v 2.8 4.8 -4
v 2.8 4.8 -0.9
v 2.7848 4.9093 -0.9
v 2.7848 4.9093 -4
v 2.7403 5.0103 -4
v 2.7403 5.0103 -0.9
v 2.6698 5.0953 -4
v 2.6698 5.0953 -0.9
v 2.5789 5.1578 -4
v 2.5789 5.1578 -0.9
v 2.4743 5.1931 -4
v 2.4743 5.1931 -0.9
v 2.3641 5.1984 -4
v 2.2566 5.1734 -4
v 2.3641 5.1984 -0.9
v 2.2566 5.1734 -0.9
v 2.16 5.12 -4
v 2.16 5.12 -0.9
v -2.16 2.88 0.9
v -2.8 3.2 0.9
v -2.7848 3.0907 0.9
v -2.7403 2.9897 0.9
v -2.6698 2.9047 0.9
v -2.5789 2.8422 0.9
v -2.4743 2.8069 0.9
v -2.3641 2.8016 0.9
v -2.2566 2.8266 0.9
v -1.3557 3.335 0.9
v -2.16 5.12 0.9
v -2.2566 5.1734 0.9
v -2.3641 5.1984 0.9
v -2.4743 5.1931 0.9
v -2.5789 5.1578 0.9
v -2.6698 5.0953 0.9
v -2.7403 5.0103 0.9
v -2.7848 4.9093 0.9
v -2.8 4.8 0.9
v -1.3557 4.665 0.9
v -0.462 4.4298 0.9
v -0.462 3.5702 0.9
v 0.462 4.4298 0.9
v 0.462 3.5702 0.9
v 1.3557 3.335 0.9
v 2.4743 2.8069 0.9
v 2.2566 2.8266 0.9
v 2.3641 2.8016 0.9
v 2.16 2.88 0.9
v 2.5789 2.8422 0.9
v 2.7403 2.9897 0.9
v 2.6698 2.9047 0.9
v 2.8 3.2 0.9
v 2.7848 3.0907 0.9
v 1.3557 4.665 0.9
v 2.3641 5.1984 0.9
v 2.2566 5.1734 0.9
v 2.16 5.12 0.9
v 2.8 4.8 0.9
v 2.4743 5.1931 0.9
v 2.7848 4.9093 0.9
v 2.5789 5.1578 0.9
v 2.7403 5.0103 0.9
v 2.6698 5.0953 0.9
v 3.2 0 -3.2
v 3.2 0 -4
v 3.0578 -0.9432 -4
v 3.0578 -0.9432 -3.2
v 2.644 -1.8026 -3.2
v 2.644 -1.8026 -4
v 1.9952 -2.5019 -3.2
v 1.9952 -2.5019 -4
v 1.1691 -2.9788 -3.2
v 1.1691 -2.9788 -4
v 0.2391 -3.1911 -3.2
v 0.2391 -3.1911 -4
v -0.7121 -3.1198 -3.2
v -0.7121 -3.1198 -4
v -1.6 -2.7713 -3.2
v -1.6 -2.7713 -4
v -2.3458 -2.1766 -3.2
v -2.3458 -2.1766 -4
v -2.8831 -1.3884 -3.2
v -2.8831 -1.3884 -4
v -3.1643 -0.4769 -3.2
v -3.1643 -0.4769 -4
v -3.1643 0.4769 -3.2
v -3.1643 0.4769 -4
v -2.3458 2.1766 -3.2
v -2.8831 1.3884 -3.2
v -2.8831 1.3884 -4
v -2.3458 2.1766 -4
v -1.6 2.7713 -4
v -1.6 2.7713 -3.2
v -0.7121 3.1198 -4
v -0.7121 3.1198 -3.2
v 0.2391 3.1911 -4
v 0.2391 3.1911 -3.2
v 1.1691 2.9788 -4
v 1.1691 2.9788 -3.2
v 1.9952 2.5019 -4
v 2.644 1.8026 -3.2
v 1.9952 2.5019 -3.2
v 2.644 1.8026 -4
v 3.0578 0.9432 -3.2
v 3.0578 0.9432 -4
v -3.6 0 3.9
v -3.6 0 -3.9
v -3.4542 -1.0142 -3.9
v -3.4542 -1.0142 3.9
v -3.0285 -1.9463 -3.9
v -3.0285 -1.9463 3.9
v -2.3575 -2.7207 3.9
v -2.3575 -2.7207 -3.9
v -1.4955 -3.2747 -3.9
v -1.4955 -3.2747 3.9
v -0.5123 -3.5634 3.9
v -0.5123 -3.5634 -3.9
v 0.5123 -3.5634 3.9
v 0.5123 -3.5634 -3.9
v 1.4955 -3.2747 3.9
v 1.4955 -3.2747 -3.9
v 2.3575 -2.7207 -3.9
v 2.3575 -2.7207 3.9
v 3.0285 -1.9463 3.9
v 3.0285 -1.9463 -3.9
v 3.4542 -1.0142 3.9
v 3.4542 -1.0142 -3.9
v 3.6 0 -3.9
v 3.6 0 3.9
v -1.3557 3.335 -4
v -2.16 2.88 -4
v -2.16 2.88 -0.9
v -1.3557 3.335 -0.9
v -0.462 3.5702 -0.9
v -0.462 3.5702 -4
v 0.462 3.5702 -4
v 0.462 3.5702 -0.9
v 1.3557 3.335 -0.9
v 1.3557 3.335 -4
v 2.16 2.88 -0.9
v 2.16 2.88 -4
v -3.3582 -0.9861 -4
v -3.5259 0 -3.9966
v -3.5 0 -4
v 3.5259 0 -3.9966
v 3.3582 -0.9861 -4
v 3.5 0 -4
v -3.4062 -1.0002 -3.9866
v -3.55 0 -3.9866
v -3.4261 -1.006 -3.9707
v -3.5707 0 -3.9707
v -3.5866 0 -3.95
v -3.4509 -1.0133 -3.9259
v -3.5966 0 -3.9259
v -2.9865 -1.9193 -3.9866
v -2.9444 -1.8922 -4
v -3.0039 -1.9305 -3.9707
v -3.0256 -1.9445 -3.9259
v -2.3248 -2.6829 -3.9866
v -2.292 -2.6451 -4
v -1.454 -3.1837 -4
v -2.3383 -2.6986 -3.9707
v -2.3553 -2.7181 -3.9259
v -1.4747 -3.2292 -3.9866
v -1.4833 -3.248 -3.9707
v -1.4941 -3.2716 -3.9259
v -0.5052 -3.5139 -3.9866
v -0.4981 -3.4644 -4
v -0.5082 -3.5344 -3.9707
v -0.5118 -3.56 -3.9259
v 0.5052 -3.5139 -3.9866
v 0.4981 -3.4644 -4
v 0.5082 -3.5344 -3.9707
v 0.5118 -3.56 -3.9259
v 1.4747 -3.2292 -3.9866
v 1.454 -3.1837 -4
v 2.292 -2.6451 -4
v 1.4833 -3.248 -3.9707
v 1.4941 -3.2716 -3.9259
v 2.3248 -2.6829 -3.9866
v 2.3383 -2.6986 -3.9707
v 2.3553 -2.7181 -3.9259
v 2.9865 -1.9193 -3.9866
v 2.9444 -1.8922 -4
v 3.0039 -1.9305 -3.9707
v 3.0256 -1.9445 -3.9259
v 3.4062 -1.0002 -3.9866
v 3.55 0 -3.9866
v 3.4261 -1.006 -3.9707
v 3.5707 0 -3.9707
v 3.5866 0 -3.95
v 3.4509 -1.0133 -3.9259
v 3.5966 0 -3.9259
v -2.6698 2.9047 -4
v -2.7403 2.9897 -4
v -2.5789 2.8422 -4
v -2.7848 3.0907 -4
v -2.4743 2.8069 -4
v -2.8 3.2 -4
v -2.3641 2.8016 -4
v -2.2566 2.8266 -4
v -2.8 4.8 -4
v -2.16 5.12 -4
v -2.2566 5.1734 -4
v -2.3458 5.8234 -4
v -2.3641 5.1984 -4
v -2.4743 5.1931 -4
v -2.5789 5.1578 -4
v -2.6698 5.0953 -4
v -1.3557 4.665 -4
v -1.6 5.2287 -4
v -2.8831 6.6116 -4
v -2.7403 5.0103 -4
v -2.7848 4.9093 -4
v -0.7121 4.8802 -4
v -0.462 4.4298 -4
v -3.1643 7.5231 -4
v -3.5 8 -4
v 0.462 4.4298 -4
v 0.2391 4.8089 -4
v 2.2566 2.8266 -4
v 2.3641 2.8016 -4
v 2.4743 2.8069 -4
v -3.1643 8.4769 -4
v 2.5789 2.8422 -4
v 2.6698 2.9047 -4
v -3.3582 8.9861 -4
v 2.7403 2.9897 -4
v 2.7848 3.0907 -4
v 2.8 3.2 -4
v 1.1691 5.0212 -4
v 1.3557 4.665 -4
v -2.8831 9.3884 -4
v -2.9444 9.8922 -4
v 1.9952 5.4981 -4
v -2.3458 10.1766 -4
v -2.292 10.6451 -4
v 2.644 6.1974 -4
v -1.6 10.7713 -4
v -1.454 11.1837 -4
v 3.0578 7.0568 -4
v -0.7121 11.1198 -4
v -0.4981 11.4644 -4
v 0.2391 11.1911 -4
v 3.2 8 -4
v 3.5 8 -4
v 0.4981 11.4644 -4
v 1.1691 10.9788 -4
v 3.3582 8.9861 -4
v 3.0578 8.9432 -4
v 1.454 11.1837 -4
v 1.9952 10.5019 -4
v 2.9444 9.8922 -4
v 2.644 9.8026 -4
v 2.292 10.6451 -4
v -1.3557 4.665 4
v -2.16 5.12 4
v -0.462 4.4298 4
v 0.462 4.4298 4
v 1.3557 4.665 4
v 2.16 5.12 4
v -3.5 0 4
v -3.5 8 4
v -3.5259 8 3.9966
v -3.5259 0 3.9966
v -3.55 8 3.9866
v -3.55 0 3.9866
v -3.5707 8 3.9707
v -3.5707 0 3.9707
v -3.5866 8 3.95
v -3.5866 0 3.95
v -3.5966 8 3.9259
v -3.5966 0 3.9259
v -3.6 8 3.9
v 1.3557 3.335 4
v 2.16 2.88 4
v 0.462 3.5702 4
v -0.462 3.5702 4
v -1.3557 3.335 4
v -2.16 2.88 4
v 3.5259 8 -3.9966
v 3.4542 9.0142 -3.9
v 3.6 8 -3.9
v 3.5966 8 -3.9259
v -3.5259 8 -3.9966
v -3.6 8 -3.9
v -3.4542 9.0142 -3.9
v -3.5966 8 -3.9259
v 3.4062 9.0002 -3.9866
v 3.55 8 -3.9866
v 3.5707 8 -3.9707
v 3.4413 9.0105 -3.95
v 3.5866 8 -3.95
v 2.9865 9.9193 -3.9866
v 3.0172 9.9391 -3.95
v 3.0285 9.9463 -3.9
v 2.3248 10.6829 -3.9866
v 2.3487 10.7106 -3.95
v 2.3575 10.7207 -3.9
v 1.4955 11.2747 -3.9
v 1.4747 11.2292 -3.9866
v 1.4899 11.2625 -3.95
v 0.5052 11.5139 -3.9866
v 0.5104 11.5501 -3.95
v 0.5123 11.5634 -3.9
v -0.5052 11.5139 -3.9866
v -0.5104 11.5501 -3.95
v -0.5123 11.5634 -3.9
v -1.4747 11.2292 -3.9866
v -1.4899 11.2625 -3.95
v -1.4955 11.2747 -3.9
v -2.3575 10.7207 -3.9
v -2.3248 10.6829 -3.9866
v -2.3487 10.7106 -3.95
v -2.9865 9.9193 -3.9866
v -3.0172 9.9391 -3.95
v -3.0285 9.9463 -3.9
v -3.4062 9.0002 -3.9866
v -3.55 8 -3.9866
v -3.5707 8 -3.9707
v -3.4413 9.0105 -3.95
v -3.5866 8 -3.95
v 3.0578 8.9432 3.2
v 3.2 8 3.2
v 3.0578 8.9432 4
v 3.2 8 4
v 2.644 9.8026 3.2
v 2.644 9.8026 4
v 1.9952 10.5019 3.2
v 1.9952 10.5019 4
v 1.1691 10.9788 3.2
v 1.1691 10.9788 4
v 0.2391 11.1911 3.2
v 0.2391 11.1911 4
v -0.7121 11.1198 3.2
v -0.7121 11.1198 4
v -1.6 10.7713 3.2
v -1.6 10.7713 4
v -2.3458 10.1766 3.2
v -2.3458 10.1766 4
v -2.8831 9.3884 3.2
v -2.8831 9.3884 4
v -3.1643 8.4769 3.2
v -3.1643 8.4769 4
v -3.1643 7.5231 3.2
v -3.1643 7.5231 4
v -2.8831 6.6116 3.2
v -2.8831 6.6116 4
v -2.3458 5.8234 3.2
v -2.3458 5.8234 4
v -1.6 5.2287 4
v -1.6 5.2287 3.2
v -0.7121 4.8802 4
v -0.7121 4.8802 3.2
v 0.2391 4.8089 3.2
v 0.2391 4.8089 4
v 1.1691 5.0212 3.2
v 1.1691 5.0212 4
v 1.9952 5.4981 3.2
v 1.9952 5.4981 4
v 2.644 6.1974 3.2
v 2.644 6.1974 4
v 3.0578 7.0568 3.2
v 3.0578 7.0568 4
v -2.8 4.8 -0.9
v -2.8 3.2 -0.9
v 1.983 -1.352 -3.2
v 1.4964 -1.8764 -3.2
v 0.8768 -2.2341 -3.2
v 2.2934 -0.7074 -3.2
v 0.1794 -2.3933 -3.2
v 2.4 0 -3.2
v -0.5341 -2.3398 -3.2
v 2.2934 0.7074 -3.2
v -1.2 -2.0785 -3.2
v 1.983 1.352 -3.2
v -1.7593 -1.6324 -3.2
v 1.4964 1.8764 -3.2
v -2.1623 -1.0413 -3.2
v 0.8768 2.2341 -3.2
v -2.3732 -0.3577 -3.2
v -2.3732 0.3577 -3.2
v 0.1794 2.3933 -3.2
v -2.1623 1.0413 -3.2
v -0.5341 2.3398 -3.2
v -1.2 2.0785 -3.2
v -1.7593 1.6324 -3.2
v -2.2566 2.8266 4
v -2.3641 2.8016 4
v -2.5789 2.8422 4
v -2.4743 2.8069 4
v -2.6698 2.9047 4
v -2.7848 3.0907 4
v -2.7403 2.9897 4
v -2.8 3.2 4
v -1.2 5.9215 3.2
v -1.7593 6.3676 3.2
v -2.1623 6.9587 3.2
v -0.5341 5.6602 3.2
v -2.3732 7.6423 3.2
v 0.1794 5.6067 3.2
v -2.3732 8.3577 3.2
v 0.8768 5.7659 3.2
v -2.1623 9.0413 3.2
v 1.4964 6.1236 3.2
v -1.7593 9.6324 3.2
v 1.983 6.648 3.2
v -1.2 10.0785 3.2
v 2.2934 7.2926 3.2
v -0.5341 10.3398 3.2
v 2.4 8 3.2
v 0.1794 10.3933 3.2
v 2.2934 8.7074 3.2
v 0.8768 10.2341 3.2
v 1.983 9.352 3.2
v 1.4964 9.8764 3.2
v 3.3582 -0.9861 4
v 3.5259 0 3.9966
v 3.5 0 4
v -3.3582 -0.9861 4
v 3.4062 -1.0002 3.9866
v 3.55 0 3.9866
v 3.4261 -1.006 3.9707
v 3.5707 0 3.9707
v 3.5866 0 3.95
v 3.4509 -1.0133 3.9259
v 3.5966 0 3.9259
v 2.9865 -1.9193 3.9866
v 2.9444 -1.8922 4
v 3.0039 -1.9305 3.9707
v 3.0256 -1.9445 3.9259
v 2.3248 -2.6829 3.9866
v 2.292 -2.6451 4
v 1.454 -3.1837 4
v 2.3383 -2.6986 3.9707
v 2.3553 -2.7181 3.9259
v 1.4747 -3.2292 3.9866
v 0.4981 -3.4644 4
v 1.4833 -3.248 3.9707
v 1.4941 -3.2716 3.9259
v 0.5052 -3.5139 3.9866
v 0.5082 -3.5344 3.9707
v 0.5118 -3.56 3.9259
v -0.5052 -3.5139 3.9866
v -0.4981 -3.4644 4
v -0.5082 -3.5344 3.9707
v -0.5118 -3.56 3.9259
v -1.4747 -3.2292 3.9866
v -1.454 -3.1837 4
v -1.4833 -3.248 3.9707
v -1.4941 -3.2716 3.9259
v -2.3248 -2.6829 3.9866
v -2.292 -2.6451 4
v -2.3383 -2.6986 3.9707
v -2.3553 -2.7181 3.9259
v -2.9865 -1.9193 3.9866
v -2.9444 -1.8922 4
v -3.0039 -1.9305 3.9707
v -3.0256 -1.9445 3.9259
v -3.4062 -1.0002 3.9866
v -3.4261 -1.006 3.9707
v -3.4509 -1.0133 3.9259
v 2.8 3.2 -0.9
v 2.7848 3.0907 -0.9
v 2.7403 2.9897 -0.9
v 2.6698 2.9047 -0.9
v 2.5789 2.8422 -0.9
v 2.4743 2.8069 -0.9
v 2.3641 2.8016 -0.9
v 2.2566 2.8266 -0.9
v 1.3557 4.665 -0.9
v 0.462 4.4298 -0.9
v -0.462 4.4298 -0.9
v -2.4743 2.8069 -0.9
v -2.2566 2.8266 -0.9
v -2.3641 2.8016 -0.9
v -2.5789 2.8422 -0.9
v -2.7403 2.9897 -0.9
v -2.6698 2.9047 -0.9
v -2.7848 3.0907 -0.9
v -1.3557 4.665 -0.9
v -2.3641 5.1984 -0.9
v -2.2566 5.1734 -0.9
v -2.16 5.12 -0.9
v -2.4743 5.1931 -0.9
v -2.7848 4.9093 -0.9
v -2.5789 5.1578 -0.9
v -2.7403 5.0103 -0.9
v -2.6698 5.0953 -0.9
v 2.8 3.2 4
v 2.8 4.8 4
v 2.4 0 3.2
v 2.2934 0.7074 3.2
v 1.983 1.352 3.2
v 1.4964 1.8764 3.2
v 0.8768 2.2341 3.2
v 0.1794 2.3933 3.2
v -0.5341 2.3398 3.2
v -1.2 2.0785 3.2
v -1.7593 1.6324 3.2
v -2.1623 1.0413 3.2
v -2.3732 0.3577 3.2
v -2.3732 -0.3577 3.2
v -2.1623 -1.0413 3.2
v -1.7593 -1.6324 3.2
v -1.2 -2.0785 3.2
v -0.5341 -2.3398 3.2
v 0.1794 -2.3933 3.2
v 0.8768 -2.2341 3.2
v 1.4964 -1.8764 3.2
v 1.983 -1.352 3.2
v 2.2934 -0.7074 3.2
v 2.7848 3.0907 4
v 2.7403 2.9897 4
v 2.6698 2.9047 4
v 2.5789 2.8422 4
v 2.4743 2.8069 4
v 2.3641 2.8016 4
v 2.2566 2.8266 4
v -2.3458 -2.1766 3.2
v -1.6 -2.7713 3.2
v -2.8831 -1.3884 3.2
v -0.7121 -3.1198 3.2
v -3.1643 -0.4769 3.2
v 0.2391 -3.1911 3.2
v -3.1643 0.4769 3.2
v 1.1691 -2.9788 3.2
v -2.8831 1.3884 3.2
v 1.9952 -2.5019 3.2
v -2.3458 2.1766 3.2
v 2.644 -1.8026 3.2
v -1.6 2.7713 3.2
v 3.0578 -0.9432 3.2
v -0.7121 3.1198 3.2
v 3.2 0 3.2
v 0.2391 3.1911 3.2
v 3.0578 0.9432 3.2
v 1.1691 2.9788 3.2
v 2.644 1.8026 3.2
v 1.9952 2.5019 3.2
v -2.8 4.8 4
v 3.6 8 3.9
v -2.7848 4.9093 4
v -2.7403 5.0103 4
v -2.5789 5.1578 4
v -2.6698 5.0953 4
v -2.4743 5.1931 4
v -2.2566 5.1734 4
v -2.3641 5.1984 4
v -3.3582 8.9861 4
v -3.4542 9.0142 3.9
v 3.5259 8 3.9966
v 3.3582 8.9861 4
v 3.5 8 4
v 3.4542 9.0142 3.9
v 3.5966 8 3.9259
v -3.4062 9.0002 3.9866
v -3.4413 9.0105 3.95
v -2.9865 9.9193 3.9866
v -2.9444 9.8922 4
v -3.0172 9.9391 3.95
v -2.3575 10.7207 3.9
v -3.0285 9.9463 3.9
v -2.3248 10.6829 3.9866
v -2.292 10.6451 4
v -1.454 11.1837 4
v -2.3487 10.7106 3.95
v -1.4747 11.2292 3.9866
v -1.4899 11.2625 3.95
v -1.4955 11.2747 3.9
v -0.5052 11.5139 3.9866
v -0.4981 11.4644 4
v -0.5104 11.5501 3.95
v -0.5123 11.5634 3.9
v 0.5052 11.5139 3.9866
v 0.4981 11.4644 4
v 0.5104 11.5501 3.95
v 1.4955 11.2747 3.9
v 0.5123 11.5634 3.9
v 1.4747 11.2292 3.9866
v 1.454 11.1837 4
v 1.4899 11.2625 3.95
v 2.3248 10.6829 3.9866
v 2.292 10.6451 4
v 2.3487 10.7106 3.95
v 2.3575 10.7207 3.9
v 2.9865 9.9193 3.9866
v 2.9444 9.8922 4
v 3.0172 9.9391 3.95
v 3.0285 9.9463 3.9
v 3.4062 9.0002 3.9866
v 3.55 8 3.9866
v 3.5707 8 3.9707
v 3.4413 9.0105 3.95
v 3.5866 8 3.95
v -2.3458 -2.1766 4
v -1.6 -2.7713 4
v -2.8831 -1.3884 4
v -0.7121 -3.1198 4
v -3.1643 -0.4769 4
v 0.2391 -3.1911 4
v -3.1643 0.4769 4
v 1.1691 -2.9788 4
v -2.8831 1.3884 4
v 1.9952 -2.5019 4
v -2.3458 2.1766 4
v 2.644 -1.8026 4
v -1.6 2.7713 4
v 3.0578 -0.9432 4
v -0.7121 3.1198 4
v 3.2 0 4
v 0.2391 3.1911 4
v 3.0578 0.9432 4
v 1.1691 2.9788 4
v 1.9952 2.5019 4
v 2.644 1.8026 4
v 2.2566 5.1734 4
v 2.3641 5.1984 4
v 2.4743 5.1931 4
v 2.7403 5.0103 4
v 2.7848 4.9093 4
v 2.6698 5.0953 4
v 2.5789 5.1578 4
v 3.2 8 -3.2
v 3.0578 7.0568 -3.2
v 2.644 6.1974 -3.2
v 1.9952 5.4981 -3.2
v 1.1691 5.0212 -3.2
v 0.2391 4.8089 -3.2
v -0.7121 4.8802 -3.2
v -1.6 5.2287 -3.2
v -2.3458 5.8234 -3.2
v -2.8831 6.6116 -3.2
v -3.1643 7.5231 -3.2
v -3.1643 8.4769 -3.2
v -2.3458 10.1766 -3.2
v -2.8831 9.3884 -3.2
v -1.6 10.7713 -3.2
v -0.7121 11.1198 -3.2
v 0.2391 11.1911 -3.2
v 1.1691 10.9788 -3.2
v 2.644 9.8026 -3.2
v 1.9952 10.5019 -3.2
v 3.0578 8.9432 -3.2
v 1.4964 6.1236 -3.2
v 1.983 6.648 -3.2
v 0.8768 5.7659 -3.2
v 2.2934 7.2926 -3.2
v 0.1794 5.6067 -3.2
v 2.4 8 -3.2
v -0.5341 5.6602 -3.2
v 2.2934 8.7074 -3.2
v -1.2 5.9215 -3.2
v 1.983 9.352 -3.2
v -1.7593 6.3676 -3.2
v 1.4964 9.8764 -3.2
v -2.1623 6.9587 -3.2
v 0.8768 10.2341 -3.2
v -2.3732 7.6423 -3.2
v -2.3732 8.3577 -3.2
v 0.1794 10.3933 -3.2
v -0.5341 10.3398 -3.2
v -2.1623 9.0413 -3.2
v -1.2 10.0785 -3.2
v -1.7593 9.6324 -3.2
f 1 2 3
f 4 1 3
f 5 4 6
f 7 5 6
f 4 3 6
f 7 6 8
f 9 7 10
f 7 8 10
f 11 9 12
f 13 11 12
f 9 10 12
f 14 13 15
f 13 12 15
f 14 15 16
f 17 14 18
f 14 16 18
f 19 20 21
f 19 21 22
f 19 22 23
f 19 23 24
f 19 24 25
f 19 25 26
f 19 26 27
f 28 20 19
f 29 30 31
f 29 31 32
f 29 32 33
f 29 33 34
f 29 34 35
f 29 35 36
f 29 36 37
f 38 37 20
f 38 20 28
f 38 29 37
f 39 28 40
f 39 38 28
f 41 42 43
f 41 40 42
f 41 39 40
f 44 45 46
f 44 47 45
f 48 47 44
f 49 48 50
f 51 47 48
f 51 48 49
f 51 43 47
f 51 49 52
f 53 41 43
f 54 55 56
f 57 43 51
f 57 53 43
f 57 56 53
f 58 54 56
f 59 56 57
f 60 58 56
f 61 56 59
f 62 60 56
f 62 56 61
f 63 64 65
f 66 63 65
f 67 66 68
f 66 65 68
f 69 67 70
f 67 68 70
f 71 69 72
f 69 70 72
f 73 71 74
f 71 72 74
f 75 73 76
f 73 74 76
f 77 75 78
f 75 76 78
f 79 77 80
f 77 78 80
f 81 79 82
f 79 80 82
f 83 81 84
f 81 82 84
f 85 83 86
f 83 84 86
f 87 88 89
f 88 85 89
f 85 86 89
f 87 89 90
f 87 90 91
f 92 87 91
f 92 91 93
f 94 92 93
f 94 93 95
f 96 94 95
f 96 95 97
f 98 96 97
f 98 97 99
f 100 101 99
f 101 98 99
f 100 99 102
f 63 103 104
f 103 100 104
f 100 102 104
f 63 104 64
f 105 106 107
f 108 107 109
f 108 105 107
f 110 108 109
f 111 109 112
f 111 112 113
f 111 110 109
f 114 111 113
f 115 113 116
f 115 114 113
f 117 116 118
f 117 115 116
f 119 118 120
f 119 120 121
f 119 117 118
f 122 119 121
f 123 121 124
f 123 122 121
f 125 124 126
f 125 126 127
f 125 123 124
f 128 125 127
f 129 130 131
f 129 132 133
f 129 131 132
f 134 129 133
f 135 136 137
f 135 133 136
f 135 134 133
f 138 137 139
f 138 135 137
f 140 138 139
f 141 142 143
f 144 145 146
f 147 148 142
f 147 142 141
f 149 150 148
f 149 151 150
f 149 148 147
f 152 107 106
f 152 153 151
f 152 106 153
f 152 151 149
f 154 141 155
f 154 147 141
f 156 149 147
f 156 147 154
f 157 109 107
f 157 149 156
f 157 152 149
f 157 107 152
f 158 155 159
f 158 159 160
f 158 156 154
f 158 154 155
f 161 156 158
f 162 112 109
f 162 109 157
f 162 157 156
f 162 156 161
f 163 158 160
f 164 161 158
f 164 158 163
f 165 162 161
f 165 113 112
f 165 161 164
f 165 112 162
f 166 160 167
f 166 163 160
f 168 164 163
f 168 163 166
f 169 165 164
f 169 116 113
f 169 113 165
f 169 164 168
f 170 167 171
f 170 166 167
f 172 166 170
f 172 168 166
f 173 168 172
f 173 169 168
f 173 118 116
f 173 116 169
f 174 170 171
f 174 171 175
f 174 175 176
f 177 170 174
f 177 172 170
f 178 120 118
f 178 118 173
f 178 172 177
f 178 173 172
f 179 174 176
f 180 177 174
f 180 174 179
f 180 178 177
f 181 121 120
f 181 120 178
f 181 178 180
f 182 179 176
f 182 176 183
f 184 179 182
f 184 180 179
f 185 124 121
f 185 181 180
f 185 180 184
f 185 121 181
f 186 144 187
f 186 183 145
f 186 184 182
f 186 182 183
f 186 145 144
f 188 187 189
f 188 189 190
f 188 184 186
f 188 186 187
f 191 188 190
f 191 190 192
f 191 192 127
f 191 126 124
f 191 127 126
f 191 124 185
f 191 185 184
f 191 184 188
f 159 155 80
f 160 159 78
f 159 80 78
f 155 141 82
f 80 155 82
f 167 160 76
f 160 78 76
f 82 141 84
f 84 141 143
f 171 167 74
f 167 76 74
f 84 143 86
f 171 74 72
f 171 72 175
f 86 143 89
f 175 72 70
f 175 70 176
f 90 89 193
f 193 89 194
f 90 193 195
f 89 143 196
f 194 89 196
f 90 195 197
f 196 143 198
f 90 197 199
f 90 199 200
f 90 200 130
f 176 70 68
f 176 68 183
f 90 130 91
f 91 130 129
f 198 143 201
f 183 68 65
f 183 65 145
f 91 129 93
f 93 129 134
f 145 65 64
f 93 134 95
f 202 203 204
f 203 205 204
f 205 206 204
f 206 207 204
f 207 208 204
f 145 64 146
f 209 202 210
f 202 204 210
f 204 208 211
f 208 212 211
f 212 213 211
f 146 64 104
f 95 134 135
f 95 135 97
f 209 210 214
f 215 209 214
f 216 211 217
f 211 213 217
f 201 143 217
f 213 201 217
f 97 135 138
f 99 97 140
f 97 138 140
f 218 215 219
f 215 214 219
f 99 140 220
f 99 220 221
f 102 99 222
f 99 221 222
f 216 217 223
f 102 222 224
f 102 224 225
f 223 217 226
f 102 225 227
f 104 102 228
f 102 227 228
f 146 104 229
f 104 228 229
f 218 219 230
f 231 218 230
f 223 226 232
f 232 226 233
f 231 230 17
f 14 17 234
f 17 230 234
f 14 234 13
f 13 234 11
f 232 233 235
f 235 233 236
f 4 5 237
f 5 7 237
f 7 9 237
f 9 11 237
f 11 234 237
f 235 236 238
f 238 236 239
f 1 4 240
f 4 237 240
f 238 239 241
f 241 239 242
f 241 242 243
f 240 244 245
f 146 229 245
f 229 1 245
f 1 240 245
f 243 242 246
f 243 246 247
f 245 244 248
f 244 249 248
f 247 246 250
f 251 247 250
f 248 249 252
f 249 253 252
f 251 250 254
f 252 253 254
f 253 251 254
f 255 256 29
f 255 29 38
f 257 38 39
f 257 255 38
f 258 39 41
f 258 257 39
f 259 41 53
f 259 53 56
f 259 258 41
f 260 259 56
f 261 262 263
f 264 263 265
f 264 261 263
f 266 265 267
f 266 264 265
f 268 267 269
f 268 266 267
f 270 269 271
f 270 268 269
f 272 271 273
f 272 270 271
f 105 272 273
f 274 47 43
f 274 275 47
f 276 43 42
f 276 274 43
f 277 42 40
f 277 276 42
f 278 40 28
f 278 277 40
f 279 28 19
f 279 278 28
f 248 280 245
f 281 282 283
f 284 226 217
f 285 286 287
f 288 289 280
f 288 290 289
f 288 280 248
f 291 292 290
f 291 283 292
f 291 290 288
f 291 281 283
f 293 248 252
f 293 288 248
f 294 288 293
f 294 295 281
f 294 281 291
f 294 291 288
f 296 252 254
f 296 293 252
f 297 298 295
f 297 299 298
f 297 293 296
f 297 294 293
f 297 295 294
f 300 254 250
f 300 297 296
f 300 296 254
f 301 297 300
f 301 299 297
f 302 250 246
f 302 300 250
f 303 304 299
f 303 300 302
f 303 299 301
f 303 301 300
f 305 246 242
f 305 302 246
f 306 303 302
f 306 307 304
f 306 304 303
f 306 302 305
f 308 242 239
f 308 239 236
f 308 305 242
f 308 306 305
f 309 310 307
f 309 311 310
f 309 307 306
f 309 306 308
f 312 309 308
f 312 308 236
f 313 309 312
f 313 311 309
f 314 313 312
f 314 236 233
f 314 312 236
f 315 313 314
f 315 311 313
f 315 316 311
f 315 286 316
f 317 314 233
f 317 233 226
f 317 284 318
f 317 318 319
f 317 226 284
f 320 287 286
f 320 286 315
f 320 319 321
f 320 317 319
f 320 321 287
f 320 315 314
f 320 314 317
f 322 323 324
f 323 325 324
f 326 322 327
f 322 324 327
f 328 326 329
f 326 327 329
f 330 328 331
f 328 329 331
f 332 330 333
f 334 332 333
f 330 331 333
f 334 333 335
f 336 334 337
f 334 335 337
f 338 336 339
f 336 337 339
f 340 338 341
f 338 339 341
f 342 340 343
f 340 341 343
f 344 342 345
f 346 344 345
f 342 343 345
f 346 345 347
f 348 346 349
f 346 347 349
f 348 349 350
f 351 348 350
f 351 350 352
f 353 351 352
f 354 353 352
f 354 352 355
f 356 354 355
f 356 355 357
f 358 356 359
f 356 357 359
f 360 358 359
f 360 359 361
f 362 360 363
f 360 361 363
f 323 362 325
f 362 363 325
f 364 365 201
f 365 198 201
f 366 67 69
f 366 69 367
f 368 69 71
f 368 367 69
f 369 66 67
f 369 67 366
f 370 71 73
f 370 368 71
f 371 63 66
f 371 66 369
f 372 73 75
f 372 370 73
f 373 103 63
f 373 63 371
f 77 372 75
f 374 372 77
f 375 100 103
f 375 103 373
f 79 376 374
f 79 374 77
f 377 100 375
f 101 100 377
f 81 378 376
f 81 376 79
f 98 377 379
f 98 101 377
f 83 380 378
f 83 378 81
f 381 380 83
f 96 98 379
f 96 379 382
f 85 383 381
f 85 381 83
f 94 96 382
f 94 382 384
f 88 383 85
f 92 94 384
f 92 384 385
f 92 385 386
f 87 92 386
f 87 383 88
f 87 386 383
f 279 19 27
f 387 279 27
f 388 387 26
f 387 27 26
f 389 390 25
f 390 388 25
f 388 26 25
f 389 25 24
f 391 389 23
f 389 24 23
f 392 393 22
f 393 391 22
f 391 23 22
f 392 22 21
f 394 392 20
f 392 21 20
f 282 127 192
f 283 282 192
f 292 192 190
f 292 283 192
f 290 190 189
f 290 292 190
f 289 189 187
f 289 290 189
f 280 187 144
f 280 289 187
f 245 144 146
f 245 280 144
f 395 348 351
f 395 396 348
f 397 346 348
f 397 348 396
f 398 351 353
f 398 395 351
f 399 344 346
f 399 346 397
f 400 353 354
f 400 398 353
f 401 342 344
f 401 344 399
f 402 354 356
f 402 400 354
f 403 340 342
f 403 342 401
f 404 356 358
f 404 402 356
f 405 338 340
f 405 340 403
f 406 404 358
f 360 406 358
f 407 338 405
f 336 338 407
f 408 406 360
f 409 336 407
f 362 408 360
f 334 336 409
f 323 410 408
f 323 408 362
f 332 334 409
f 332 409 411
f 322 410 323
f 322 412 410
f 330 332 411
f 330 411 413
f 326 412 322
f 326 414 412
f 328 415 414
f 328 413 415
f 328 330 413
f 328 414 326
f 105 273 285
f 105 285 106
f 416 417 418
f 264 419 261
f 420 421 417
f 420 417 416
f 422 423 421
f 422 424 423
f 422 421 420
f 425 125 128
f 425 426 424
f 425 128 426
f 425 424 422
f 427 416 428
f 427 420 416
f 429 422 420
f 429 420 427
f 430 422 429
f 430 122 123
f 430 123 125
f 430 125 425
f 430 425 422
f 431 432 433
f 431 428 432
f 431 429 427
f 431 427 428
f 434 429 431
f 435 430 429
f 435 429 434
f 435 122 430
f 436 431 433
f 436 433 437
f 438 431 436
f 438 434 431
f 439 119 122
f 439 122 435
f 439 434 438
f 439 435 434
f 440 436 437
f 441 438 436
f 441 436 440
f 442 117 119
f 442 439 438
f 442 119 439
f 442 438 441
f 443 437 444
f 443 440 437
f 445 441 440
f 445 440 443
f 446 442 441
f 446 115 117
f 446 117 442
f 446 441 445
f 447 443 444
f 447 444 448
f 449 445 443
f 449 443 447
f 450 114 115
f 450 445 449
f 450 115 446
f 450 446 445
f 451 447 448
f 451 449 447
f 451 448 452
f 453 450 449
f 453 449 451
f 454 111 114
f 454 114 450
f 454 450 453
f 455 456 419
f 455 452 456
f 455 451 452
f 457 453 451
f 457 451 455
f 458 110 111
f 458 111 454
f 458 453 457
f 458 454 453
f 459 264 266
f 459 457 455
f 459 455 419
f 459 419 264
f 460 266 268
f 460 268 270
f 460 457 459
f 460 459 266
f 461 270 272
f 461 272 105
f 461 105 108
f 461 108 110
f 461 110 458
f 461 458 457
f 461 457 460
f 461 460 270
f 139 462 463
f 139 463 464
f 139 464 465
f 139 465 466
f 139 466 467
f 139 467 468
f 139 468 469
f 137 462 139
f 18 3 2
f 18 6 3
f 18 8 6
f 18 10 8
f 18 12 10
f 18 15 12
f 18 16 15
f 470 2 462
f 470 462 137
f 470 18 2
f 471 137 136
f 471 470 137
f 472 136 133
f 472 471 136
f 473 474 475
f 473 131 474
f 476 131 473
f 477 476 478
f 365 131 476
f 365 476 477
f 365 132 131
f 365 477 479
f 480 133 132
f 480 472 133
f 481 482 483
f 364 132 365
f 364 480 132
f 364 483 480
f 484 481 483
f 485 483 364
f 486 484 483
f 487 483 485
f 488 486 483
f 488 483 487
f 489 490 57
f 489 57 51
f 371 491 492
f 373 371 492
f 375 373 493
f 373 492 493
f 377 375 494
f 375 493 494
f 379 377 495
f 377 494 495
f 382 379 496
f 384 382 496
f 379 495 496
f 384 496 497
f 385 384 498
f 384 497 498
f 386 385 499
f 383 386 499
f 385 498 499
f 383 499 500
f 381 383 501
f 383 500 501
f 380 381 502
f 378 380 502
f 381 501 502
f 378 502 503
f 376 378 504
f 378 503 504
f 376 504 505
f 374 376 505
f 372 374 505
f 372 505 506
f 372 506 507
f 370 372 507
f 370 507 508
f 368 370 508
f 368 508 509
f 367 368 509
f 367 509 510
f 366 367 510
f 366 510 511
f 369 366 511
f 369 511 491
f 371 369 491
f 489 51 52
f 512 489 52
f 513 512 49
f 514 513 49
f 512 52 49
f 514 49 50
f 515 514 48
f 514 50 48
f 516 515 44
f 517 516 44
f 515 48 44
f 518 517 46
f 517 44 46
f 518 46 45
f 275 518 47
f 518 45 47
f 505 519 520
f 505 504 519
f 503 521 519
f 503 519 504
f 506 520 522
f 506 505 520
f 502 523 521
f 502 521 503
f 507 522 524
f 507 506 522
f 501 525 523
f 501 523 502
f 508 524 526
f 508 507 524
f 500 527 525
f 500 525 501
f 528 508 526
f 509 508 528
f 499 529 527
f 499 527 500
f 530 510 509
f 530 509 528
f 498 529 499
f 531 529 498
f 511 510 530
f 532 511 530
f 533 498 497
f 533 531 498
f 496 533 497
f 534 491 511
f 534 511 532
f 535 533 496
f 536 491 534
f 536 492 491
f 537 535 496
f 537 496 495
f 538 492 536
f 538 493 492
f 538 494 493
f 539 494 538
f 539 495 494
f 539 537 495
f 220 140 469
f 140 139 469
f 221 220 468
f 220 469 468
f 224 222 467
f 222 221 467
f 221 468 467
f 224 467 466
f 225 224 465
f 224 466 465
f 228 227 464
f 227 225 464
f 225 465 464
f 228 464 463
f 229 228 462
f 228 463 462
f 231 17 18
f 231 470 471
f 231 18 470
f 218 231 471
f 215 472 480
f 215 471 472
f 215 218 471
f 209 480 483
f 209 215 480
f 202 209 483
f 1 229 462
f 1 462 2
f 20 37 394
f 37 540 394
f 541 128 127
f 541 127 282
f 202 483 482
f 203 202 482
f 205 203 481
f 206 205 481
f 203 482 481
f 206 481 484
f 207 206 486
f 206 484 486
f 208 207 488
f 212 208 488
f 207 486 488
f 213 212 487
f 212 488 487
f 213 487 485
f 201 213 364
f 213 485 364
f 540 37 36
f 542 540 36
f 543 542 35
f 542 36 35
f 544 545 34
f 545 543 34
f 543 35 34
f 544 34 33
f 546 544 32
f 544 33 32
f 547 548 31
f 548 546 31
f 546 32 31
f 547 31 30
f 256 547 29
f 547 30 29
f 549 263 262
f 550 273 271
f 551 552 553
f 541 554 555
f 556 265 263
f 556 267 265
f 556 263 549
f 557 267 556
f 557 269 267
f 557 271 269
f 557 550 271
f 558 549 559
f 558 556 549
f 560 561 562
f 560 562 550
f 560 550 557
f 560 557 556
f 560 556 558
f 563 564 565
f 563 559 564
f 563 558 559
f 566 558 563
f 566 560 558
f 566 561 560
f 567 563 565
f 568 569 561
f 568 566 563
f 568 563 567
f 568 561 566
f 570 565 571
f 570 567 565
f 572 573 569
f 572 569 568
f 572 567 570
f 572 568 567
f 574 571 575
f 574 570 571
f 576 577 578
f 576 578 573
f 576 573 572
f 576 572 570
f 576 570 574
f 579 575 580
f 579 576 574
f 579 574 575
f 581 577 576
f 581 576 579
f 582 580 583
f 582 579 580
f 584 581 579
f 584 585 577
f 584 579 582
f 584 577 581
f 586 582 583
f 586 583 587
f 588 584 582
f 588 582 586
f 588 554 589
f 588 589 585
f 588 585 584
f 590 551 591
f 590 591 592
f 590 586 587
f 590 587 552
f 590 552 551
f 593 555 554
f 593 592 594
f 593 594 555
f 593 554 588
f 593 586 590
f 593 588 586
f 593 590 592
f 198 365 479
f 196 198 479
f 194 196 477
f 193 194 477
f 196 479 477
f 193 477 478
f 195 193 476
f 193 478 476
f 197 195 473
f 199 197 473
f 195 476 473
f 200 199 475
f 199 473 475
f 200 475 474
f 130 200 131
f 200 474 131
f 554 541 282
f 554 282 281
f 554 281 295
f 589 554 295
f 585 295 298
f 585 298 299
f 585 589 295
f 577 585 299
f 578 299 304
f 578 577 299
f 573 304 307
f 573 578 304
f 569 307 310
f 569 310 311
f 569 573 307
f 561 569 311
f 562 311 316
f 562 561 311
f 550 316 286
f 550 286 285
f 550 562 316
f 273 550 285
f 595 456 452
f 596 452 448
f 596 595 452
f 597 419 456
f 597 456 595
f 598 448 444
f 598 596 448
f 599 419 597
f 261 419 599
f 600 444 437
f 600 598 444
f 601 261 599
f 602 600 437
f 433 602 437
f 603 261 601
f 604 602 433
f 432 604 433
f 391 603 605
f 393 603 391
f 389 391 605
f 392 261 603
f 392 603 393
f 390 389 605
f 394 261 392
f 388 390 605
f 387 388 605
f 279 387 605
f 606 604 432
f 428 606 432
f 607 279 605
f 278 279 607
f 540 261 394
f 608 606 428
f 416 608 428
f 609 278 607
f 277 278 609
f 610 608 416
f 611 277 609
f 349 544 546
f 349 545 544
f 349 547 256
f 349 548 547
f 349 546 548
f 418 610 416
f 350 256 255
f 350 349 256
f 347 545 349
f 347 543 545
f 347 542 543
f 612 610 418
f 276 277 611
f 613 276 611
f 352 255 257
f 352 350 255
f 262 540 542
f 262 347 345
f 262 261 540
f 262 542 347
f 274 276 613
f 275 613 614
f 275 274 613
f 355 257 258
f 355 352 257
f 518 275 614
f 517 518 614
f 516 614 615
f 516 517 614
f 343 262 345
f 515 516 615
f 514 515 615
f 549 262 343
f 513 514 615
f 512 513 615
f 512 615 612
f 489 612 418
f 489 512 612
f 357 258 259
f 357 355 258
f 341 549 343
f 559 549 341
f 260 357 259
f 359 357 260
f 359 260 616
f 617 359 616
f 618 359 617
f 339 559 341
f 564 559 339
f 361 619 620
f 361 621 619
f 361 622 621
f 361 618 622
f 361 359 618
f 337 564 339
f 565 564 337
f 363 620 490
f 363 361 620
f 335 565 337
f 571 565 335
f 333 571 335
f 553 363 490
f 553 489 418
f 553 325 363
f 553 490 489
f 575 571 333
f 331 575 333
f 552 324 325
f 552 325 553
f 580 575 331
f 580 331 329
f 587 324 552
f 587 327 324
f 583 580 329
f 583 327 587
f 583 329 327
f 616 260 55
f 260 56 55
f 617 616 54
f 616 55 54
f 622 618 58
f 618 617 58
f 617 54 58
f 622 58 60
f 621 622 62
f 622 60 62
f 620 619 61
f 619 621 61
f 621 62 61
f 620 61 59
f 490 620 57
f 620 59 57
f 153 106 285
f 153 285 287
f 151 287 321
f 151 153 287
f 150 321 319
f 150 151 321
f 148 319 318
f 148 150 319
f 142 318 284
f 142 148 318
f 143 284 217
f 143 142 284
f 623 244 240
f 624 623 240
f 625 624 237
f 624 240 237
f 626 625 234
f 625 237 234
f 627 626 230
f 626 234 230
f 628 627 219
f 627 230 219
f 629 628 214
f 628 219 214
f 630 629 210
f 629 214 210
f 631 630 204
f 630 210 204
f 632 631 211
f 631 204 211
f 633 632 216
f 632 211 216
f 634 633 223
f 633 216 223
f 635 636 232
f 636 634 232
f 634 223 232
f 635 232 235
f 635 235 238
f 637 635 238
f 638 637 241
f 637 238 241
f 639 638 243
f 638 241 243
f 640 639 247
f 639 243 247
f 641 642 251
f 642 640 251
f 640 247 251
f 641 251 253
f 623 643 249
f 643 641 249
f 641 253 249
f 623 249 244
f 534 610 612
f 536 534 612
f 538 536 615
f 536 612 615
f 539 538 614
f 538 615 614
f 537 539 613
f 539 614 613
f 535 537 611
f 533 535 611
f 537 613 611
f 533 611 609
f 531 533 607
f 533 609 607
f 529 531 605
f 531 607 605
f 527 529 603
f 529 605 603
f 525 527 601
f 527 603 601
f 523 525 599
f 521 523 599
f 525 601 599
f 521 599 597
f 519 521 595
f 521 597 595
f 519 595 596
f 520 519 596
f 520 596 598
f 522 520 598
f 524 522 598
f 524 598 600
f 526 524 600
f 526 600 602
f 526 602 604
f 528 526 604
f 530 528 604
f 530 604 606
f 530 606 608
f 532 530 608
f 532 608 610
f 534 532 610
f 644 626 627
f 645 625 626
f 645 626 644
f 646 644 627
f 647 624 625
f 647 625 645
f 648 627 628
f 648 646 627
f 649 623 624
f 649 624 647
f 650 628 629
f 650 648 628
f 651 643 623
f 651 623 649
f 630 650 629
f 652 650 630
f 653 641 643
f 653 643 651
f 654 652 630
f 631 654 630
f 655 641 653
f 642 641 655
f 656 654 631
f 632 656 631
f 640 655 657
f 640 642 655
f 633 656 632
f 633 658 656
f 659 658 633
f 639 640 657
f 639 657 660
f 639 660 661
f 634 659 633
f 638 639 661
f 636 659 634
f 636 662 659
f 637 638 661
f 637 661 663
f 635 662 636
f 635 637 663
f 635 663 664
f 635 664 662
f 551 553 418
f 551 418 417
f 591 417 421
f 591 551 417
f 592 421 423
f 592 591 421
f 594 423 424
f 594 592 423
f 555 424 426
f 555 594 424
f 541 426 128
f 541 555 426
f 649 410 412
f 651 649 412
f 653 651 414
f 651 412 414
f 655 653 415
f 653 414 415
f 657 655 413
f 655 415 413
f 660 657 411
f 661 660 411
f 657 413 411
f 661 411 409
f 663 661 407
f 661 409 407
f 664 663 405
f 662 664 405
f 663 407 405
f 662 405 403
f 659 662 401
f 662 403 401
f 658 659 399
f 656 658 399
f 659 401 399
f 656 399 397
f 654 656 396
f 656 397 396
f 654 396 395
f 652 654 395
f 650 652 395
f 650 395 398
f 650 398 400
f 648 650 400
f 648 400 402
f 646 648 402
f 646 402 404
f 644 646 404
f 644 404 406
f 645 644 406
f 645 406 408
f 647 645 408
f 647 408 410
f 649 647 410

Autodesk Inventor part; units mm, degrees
ref_plane "YZ Plane" through (0, 0, 0) normal (1, 0, 0) x (0, 1, 0)
ref_plane "XZ Plane" through (0, 0, 0) normal (0, 1, 0) x (-1, 0, 0)
ref_plane "XY Plane" through (0, 0, 0) normal (0, 0, 1) x (1, 0, 0)
sketch "Sketch1" plane through (0, 0, 0) normal (0, 0, 1) x (1, 0, 0)
  line L0 (3.6, 0) -> (3.6, 8)
  line L1 (-3.6, 8) -> (-3.6, 0)
  arc A0 (3.6, 8) -> (-3.6, 8) centre (0, 8) ccw
  circle A1 centre (0, 8) radius 2.4
  circle A2 centre (0, 8) radius 3.2
  circle A3 centre (0, 0) radius 3.2
  circle A4 centre (0, 0) radius 2.4
  line L2 (0, 0) -> (0, 8) construction
  line L3 (-2.8, 5.7373) -> (-2.8, 2.2627)
  line L4 (2.8, 5.7373) -> (2.8, 2.2627)
  arc A5 (-2.8, 5.7373) -> (2.8, 5.7373) centre (0, 8) ccw
  arc A6 (2.8, 2.2627) -> (-2.8, 2.2627) centre (0, 0) ccw
  arc A7 (-3.6, 0) -> (3.6, 0) centre (0, 0) ccw
  line L5 (0, 0) -> (0, -8) construction
  dimension "d8" = 4.8
  dimension "d9" = 6.4
  dimension "d32" = 7.2
  dimension "d34" = 8
  dimension "d36" = 0.8
extrude "Extrusion1" add sketch "Sketch1" along normal mid plane 8 contours A7 L1 A0 L0 | A2 | A3 | A5 L4 A6 L3
sketch "Sketch6" plane through (0, 0, 4) normal (0, 0, 1) x (1, 0, 0)
  circle A0 centre (0, 0) radius 2.4 projected
  circle A1 centre (0, 8) radius 2.4 projected
  circle A2 centre (0, 0) radius 3.2 projected
  circle A3 centre (0, 8) radius 3.2 projected
  arc A4 (2.8, 2.2627) -> (-2.8, 2.2627) centre (0, 0) ccw projected
  line L0 (-2.8, 5.7373) -> (-2.8, 2.2627) projected
  arc A5 (-2.8, 5.7373) -> (2.8, 5.7373) centre (0, 8) ccw projected
  line L1 (2.8, 5.7373) -> (2.8, 2.2627) projected
extrude "Extrusion7" cut sketch "Sketch6" against normal blind 0.8 contours A2 | A3
extrude "Extrusion8" cut sketch "Sketch6" against normal blind 3.1 contours A4 L0 A5 L1
mirror "Mirror1" about plane through (0, 0, 0) normal (0, 0, 1) of "Extrusion7", "Extrusion8"
fillet "Fillet1" radius 0.1 6 edges at (0, 11.6, 4) (3.6, 4, 4) (-3.6, 4, 4) (0, 11.6, -4) (-3.6, 4, -4) (3.6, 4, -4)
fillet "Fillet1" radius 0.4 8 edges at (-2.8, 2.2627, 2.45) (-2.8, 5.7373, 2.45) (2.8, 2.2627, 2.45) (2.8, 5.7373, 2.45) (2.8, 5.7373, -2.45) (2.8, 2.2627, -2.45) (-2.8, 2.2627, -2.45) (-2.8, 5.7373, -2.45)
equation "\"d8\" = tpd"
equation "\"d9\" = tsd"
equation "\"d32\" = tlad"
equation "\"d34\" = lu"
equation "\"d14\" = lu"
equation "\"d41\" = tsl"
equation "\"d45\" = lf"
equation "\"d46\" = tf"
equation "\"tpd\" = 4.8"
equation "\"tsd\" = 6.4"
equation "\"tlad\" = 7.2"
equation "\"lu\" = 8"
equation "\"tsl\" = 0.8"
equation "\"lf\" = 0.1"
equation "\"tf\" = 0.4"
properties part number "43857-LtBluishGray" material "ABS Plastic"
